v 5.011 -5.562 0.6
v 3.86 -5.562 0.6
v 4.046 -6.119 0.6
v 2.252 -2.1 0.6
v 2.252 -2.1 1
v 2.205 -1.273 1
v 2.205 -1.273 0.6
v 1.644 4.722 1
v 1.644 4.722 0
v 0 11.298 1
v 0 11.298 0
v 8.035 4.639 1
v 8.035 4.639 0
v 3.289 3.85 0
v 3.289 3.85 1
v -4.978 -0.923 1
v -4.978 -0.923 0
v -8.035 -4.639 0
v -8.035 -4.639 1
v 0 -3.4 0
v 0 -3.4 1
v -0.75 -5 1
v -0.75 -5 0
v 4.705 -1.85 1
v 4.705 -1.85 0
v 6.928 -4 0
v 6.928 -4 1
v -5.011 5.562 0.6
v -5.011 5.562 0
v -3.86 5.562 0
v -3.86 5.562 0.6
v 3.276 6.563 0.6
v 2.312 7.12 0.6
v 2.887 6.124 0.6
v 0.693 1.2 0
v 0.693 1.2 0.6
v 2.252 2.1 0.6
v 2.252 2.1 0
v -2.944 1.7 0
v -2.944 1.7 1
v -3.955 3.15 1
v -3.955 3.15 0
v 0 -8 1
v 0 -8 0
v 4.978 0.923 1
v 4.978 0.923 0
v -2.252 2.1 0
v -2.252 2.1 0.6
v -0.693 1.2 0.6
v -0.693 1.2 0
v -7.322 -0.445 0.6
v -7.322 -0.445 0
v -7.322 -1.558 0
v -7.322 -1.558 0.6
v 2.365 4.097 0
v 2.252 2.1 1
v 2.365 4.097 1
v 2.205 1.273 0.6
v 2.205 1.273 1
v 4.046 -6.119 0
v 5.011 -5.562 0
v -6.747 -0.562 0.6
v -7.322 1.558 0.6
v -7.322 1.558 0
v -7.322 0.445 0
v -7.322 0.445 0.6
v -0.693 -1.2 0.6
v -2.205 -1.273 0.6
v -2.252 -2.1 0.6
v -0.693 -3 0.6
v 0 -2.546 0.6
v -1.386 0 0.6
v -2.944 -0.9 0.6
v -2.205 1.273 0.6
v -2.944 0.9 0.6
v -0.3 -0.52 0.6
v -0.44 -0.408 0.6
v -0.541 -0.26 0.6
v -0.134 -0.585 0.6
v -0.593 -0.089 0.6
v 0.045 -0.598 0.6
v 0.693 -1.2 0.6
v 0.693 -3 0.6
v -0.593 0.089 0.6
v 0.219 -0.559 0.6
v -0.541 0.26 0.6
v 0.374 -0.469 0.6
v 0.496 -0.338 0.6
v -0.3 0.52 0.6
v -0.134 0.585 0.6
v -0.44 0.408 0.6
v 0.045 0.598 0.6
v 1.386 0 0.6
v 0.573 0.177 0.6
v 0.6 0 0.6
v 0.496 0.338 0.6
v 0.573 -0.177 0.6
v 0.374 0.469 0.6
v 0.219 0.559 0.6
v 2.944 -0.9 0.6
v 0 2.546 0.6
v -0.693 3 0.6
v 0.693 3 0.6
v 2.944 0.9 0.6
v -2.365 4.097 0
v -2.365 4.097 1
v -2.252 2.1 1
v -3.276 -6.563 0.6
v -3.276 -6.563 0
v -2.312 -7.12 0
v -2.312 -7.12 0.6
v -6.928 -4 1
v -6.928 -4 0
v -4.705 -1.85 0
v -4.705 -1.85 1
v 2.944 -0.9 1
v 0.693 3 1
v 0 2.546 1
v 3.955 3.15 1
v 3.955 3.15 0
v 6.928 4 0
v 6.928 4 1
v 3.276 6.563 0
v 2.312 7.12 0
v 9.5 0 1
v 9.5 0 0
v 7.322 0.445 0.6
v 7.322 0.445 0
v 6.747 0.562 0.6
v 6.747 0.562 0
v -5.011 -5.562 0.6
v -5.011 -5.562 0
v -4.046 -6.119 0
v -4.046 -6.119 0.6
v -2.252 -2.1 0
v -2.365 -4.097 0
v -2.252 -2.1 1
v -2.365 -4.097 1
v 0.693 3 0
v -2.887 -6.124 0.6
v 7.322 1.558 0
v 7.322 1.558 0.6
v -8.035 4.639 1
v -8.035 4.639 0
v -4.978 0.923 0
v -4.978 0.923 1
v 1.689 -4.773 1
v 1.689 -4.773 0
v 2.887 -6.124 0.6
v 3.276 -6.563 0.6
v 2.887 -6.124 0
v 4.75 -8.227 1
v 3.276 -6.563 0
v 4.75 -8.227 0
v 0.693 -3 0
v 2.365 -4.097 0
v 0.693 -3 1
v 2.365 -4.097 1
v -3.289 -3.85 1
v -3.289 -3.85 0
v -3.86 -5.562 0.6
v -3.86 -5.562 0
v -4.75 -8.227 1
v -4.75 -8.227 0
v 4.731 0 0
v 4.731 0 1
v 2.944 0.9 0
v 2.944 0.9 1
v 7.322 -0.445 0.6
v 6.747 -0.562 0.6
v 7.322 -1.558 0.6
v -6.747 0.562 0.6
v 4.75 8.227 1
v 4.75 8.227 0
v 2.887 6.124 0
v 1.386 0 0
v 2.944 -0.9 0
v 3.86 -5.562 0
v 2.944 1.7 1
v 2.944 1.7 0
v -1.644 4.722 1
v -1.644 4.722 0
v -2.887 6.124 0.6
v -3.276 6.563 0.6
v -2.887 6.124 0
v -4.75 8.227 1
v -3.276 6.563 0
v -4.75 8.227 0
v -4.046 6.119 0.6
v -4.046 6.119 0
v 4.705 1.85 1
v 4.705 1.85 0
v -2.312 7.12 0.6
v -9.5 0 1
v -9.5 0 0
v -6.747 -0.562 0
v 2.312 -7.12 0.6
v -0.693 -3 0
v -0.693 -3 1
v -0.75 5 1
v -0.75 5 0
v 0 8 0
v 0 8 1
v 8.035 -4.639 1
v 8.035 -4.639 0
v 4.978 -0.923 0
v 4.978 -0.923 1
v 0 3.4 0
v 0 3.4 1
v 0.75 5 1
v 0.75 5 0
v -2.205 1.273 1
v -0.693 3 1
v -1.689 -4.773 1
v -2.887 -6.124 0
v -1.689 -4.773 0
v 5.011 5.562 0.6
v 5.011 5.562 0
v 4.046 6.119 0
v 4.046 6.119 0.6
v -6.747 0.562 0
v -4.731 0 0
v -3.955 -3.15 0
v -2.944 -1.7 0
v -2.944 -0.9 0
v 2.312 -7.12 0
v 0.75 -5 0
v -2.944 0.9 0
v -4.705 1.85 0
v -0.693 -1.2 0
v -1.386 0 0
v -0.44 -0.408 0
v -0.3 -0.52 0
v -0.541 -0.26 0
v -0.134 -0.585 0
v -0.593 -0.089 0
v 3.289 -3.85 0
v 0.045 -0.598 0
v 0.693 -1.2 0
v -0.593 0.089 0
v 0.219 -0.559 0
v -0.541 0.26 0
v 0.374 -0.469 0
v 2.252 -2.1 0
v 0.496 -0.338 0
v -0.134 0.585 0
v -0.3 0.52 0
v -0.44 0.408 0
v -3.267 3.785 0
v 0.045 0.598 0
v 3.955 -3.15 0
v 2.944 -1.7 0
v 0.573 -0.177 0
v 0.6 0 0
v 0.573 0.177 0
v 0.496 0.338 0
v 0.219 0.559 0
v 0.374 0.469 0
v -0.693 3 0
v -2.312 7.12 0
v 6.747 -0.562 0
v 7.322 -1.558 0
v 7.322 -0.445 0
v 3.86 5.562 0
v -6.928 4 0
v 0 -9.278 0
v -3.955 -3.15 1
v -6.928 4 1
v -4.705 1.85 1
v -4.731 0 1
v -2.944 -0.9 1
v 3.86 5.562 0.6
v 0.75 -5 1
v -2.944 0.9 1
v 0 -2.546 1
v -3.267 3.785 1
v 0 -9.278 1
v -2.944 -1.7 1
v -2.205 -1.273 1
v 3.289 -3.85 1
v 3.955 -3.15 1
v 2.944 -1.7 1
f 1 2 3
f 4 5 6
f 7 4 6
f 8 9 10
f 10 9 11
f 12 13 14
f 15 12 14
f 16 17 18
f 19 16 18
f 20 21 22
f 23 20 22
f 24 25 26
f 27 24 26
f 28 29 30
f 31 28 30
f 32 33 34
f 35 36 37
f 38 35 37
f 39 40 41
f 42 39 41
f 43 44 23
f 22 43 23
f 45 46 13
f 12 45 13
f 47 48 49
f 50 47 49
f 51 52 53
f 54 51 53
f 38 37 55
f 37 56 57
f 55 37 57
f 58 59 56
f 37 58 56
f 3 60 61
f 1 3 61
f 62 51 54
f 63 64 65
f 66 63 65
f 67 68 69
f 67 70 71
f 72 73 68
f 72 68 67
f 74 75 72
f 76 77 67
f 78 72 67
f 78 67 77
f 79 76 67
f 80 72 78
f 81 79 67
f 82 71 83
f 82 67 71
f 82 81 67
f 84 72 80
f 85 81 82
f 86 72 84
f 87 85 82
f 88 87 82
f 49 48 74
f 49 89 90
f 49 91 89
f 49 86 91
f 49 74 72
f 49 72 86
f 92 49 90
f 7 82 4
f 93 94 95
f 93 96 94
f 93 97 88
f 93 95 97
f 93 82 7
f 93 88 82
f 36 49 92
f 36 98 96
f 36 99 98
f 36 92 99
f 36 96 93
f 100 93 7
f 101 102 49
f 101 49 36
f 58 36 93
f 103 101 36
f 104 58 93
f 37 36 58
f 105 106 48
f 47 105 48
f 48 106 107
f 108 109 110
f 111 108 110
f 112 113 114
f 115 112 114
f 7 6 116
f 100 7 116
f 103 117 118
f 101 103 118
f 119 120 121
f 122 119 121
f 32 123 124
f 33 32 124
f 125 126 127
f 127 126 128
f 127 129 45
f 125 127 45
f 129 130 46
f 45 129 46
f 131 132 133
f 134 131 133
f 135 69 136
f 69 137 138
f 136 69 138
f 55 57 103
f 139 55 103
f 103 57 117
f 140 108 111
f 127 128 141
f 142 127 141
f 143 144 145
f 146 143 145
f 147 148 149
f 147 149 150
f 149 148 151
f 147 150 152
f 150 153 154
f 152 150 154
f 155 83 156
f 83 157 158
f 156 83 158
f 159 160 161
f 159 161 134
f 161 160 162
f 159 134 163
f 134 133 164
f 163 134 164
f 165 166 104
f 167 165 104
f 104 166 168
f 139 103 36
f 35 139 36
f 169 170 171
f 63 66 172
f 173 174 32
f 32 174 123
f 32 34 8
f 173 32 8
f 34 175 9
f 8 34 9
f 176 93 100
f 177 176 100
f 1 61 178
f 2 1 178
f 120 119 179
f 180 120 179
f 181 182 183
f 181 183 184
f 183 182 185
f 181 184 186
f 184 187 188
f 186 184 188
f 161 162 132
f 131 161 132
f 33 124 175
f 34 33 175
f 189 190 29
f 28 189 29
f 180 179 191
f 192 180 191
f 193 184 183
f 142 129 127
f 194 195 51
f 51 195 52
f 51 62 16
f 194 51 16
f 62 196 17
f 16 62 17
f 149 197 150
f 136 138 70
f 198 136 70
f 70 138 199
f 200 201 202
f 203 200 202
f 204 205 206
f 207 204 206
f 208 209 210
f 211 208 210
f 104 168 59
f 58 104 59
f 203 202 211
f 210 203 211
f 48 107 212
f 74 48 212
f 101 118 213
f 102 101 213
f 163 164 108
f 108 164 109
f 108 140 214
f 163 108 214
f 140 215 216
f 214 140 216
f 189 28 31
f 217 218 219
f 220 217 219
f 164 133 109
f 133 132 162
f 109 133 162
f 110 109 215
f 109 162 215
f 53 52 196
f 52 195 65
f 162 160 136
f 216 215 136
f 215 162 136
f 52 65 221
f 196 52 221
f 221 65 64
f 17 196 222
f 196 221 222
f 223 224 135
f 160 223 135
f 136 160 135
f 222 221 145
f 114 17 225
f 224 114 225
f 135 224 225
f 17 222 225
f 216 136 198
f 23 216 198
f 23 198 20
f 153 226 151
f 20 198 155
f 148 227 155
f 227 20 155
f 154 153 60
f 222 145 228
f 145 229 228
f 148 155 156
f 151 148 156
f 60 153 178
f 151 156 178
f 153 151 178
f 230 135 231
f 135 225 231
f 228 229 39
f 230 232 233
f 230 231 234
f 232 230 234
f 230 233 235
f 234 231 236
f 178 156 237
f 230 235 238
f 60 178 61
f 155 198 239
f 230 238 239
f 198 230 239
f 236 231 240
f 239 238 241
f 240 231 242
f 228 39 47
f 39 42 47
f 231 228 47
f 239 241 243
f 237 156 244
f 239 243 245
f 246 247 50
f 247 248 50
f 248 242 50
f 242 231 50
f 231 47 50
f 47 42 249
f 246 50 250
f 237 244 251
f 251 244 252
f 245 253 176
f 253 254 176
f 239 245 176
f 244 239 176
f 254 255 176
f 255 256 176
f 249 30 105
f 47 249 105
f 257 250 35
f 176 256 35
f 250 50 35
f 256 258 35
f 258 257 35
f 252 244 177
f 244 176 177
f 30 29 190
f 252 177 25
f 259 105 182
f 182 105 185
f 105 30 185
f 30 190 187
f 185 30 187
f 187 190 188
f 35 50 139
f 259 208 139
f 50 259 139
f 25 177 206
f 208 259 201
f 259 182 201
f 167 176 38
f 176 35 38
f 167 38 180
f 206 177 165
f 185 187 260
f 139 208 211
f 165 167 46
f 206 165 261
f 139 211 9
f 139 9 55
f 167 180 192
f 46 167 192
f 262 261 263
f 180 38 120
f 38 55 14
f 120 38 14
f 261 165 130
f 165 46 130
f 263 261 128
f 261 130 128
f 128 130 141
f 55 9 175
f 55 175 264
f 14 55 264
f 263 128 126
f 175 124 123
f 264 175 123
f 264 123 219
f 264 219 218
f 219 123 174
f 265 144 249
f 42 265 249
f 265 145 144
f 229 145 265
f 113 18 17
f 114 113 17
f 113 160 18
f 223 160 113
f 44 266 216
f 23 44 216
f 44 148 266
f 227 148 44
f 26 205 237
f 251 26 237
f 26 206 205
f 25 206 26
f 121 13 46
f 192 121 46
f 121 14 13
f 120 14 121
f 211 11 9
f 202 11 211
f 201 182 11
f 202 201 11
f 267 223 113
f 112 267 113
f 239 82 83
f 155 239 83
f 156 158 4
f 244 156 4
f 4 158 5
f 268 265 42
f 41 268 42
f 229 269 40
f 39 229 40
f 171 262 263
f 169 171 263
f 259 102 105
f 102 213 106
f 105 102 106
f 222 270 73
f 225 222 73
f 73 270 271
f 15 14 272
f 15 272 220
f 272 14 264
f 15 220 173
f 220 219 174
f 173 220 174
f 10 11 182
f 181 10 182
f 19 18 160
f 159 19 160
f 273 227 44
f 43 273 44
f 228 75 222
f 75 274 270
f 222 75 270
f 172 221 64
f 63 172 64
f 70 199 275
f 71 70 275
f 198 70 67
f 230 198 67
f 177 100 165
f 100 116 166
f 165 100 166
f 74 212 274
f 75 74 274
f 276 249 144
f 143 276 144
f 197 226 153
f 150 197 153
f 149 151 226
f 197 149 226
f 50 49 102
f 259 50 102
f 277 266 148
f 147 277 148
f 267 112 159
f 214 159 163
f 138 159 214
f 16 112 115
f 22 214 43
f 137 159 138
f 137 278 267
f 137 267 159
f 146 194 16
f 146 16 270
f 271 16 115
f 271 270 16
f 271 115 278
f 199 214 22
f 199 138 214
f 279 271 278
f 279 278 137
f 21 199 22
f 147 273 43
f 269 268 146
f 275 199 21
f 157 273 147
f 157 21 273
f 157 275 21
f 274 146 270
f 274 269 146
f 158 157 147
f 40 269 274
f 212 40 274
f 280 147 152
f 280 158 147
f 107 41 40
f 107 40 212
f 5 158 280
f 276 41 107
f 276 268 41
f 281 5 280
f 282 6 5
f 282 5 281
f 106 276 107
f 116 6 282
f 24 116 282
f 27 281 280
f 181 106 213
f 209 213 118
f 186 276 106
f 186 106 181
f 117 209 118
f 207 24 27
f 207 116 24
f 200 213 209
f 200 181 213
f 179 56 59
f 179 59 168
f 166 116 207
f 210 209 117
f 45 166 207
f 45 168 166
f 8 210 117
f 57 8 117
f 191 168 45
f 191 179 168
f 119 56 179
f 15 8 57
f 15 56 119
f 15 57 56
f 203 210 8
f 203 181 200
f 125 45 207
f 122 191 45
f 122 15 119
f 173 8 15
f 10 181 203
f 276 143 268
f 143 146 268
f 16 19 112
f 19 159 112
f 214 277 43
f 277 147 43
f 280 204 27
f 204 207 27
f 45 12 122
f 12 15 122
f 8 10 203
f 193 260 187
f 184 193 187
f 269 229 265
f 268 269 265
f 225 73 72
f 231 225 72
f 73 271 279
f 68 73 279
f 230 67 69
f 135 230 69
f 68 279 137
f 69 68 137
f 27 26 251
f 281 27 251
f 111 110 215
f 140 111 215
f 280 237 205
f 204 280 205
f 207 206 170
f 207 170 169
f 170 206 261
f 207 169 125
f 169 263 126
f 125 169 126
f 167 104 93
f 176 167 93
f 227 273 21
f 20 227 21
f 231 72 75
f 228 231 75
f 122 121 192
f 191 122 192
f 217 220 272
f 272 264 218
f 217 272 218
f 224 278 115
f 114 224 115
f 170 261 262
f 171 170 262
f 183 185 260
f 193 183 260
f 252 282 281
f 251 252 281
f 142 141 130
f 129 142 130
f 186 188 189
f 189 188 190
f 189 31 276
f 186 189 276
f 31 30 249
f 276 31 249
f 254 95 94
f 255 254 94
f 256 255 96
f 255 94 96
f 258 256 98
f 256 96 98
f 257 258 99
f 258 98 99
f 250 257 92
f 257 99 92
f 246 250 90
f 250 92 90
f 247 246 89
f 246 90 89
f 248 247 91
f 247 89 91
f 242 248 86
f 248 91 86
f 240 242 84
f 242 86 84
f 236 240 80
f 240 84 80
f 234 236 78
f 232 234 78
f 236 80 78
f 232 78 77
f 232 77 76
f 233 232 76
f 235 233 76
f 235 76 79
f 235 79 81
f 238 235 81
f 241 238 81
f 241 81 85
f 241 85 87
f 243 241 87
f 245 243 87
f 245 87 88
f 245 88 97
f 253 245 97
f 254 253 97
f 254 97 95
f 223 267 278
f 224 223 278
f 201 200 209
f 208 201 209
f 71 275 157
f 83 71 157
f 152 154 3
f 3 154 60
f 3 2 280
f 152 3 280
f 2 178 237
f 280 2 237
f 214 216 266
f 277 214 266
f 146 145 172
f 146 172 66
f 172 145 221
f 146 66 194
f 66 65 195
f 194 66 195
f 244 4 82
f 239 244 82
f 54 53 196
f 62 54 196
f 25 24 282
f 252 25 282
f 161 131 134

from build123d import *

# Parameters (mm, degrees)
F1_DEPTH = 1
F2_R     = 0.6
F3_DEPTH = 25
F5_DEPTH = 0.4
F7_DEPTH = 0.6


with BuildPart() as f1:
    # F0 (on Top) → F1 (new body)
    with BuildSketch(Plane.XY):
        with BuildLine():
            Line((0, 11.298485), (-1.644133, 4.721951))
            ThreePointArc((-1.644133, 4.721951), (-2.5, 4.330127), (-3.267263, 3.784837))
            Line((-3.267263, 3.784837), (-8.035331, 4.6392))
            Line((-8.035331, 4.6392), (-4.978388, 0.923433))
            Line((-4.978388, 0.923433), (-4.92561, 0.859281))
            ThreePointArc((-4.92561, 0.859281), (-5, 0), (-4.92561, -0.859281))
            Line((-4.92561, -0.859281), (-4.978388, -0.923433))
            Line((-4.978388, -0.923433), (-8.035331, -4.6392))
            Line((-8.035331, -4.6392), (-3.288911, -3.849694))
            Line((-3.288911, -3.849694), (-3.206964, -3.836063))
            ThreePointArc((-3.206964, -3.836063), (-2.5, -4.330127), (-1.718646, -4.695344))
            Line((-1.718646, -4.695344), (-1.689478, -4.773127))
            Line((-1.689478, -4.773127), (0, -9.278401))
            Line((0, -9.278401), (1.689478, -4.773127))
            Line((1.689478, -4.773127), (1.718646, -4.695344))
            ThreePointArc((1.718646, -4.695344), (2.5, -4.330127), (3.206964, -3.836063))
            Line((3.206964, -3.836063), (3.288911, -3.849694))
            Line((3.288911, -3.849694), (8.035331, -4.6392))
            Line((8.035331, -4.6392), (4.978388, -0.923433))
            Line((4.978388, -0.923433), (4.92561, -0.859281))
            ThreePointArc((4.92561, -0.859281), (5, 0), (4.92561, 0.859281))
            Line((4.92561, 0.859281), (4.978388, 0.923433))
            Line((4.978388, 0.923433), (8.035331, 4.6392))
            Line((8.035331, 4.6392), (3.288911, 3.849694))
            Line((3.288911, 3.849694), (3.206964, 3.836063))
            ThreePointArc((3.206964, 3.836063), (2.465661, 4.349772), (1.644133, 4.721951))
            Line((1.644133, 4.721951), (0, 11.298485))
        make_face()
        Polygon((-4.705127, -1.850481), (-3.955127, -3.149519), (-6.928203, -4), align=None, mode=Mode.SUBTRACT)
        Polygon((-0.75, -5), (0.75, -5), (0, -8), align=None, mode=Mode.SUBTRACT)
        Polygon((3.955127, -3.149519), (4.705127, -1.850481), (6.928203, -4), align=None, mode=Mode.SUBTRACT)
        Polygon((-3.955127, 3.149519), (-4.705127, 1.850481), (-6.928203, 4), align=None, mode=Mode.SUBTRACT)
        Polygon((4.705127, 1.850481), (3.955127, 3.149519), (6.928203, 4), align=None, mode=Mode.SUBTRACT)
        Polygon((-0.75, 5), (0, 8), (0.75, 5), align=None, mode=Mode.SUBTRACT)
        with BuildLine():
            ThreePointArc((-3.267263, 3.784837), (-2.5, 4.330127), (-1.644133, 4.721951))
            Line((-1.644133, 4.721951), (-4.75, 8.227241))
            Line((-4.75, 8.227241), (-3.267263, 3.784837))
        make_face()
        with BuildLine():
            Line((4.75, 8.227241), (1.644133, 4.721951))
            ThreePointArc((1.644133, 4.721951), (2.465661, 4.349772), (3.206964, 3.836063))
            Line((3.206964, 3.836063), (3.288911, 3.849694))
            Line((3.288911, 3.849694), (4.75, 8.227241))
        make_face()
        with BuildLine():
            Line((-4.92561, 0.859281), (-4.978388, 0.923433))
            Line((-4.978388, 0.923433), (-9.5, 0))
            Line((-9.5, 0), (-4.978388, -0.923433))
            Line((-4.978388, -0.923433), (-4.92561, -0.859281))
            ThreePointArc((-4.92561, -0.859281), (-5, 0), (-4.92561, 0.859281))
        make_face()
        with BuildLine():
            Line((9.5, 0), (4.978388, 0.923433))
            Line((4.978388, 0.923433), (4.92561, 0.859281))
            ThreePointArc((4.92561, 0.859281), (5, 0), (4.92561, -0.859281))
            Line((4.92561, -0.859281), (4.978388, -0.923433))
            Line((4.978388, -0.923433), (9.5, 0))
        make_face()
        with BuildLine():
            Line((-3.206964, -3.836063), (-3.288911, -3.849694))
            Line((-3.288911, -3.849694), (-4.75, -8.227241))
            Line((-4.75, -8.227241), (-1.689478, -4.773127))
            Line((-1.689478, -4.773127), (-1.718646, -4.695344))
            ThreePointArc((-1.718646, -4.695344), (-2.5, -4.330127), (-3.206964, -3.836063))
        make_face()
        with BuildLine():
            Line((4.75, -8.227241), (3.288911, -3.849694))
            Line((3.288911, -3.849694), (3.206964, -3.836063))
            ThreePointArc((3.206964, -3.836063), (2.5, -4.330127), (1.718646, -4.695344))
            Line((1.718646, -4.695344), (1.689478, -4.773127))
            Line((1.689478, -4.773127), (4.75, -8.227241))
        make_face()
    extrude(amount=F1_DEPTH)

    # F2 (on face) → F3 (cut)
    with BuildSketch(Plane.XY.offset(1)):
        Polygon((0.75, 5), (-0.75, 5), (0, 3.4), align=None)
        Polygon((2.365272, 4.096771), (0.69282, 3), (0.69282, 1.2), (2.251666, 2.1), align=None)
        Polygon((-2.944486, 1.7), (-3.955127, 3.149519), (-4.705127, 1.850481), align=None)
        Polygon((-0.69282, 3), (-2.365272, 4.096771), (-2.251666, 2.1), (-0.69282, 1.2), align=None)
        Polygon((-2.944486, -1.7), (-4.705127, -1.850481), (-3.955127, -3.149519), align=None)
        Polygon((-2.944486, 0.9), (-4.730543, 0), (-2.944486, -0.9), (-1.385641, 0), align=None)
        Polygon((0, -3.4), (-0.75, -5), (0.75, -5), align=None)
        Polygon((-2.251666, -2.1), (-2.365272, -4.096771), (-0.69282, -3), (-0.69282, -1.2), align=None)
        Polygon((2.944486, -1.7), (3.955127, -3.149519), (4.705127, -1.850481), align=None)
        Polygon((0.69282, -3), (2.365272, -4.096771), (2.251666, -2.1), (0.69282, -1.2), align=None)
        Polygon((2.944486, 1.7), (4.705127, 1.850481), (3.955127, 3.149519), align=None)
        Polygon((2.944486, -0.9), (4.730543, 0), (2.944486, 0.9), (1.385641, 0), align=None)
        Circle(F2_R)
    extrude(amount=-F3_DEPTH, mode=Mode.SUBTRACT)

    # F4 (on face) → F5 (cut)
    with BuildSketch(Plane.XY.offset(1)):
        Polygon((0, 2.545658), (-0.69282, 3), (-0.69282, 1.2), (-2.251666, 2.1), (-2.204604, 1.272829), (-2.944486, 0.9), (-1.385641, 0), (-2.944486, -0.9), (-2.204604, -1.272829), (-2.251666, -2.1), (-0.69282, -1.2), (-0.69282, -3), (0, -2.545658), (0.69282, -3), (0.69282, -1.2), (2.251666, -2.1), (2.204604, -1.272829), (2.944486, -0.9), (1.385641, 0), (2.944486, 0.9), (2.204604, 1.272829), (2.251666, 2.1), (0.69282, 1.2), (0.69282, 3), align=None)
    extrude(amount=-F5_DEPTH, mode=Mode.SUBTRACT)

    # F6 (on Top) → F7 (join)
    with BuildSketch(Plane.XY):
        Polygon((-2.311537, 7.120197), (-5.010503, 5.561948), (-3.211192, 5.561948), align=None)
        Polygon((-7.32204, 1.558248), (-7.32204, -1.558248), (-6.422384, 0), align=None)
        Polygon((-5.010503, -5.561948), (-2.311537, -7.120197), (-3.211192, -5.561948), align=None)
        Polygon((2.311537, -7.120197), (5.010503, -5.561948), (3.211192, -5.561948), align=None)
        Polygon((7.32204, -1.558248), (7.32204, 1.558248), (6.422384, 0), align=None)
        Polygon((5.010503, 5.561948), (2.311537, 7.120197), (3.211192, 5.561948), align=None)
    extrude(amount=F7_DEPTH)


solid = f1.part
